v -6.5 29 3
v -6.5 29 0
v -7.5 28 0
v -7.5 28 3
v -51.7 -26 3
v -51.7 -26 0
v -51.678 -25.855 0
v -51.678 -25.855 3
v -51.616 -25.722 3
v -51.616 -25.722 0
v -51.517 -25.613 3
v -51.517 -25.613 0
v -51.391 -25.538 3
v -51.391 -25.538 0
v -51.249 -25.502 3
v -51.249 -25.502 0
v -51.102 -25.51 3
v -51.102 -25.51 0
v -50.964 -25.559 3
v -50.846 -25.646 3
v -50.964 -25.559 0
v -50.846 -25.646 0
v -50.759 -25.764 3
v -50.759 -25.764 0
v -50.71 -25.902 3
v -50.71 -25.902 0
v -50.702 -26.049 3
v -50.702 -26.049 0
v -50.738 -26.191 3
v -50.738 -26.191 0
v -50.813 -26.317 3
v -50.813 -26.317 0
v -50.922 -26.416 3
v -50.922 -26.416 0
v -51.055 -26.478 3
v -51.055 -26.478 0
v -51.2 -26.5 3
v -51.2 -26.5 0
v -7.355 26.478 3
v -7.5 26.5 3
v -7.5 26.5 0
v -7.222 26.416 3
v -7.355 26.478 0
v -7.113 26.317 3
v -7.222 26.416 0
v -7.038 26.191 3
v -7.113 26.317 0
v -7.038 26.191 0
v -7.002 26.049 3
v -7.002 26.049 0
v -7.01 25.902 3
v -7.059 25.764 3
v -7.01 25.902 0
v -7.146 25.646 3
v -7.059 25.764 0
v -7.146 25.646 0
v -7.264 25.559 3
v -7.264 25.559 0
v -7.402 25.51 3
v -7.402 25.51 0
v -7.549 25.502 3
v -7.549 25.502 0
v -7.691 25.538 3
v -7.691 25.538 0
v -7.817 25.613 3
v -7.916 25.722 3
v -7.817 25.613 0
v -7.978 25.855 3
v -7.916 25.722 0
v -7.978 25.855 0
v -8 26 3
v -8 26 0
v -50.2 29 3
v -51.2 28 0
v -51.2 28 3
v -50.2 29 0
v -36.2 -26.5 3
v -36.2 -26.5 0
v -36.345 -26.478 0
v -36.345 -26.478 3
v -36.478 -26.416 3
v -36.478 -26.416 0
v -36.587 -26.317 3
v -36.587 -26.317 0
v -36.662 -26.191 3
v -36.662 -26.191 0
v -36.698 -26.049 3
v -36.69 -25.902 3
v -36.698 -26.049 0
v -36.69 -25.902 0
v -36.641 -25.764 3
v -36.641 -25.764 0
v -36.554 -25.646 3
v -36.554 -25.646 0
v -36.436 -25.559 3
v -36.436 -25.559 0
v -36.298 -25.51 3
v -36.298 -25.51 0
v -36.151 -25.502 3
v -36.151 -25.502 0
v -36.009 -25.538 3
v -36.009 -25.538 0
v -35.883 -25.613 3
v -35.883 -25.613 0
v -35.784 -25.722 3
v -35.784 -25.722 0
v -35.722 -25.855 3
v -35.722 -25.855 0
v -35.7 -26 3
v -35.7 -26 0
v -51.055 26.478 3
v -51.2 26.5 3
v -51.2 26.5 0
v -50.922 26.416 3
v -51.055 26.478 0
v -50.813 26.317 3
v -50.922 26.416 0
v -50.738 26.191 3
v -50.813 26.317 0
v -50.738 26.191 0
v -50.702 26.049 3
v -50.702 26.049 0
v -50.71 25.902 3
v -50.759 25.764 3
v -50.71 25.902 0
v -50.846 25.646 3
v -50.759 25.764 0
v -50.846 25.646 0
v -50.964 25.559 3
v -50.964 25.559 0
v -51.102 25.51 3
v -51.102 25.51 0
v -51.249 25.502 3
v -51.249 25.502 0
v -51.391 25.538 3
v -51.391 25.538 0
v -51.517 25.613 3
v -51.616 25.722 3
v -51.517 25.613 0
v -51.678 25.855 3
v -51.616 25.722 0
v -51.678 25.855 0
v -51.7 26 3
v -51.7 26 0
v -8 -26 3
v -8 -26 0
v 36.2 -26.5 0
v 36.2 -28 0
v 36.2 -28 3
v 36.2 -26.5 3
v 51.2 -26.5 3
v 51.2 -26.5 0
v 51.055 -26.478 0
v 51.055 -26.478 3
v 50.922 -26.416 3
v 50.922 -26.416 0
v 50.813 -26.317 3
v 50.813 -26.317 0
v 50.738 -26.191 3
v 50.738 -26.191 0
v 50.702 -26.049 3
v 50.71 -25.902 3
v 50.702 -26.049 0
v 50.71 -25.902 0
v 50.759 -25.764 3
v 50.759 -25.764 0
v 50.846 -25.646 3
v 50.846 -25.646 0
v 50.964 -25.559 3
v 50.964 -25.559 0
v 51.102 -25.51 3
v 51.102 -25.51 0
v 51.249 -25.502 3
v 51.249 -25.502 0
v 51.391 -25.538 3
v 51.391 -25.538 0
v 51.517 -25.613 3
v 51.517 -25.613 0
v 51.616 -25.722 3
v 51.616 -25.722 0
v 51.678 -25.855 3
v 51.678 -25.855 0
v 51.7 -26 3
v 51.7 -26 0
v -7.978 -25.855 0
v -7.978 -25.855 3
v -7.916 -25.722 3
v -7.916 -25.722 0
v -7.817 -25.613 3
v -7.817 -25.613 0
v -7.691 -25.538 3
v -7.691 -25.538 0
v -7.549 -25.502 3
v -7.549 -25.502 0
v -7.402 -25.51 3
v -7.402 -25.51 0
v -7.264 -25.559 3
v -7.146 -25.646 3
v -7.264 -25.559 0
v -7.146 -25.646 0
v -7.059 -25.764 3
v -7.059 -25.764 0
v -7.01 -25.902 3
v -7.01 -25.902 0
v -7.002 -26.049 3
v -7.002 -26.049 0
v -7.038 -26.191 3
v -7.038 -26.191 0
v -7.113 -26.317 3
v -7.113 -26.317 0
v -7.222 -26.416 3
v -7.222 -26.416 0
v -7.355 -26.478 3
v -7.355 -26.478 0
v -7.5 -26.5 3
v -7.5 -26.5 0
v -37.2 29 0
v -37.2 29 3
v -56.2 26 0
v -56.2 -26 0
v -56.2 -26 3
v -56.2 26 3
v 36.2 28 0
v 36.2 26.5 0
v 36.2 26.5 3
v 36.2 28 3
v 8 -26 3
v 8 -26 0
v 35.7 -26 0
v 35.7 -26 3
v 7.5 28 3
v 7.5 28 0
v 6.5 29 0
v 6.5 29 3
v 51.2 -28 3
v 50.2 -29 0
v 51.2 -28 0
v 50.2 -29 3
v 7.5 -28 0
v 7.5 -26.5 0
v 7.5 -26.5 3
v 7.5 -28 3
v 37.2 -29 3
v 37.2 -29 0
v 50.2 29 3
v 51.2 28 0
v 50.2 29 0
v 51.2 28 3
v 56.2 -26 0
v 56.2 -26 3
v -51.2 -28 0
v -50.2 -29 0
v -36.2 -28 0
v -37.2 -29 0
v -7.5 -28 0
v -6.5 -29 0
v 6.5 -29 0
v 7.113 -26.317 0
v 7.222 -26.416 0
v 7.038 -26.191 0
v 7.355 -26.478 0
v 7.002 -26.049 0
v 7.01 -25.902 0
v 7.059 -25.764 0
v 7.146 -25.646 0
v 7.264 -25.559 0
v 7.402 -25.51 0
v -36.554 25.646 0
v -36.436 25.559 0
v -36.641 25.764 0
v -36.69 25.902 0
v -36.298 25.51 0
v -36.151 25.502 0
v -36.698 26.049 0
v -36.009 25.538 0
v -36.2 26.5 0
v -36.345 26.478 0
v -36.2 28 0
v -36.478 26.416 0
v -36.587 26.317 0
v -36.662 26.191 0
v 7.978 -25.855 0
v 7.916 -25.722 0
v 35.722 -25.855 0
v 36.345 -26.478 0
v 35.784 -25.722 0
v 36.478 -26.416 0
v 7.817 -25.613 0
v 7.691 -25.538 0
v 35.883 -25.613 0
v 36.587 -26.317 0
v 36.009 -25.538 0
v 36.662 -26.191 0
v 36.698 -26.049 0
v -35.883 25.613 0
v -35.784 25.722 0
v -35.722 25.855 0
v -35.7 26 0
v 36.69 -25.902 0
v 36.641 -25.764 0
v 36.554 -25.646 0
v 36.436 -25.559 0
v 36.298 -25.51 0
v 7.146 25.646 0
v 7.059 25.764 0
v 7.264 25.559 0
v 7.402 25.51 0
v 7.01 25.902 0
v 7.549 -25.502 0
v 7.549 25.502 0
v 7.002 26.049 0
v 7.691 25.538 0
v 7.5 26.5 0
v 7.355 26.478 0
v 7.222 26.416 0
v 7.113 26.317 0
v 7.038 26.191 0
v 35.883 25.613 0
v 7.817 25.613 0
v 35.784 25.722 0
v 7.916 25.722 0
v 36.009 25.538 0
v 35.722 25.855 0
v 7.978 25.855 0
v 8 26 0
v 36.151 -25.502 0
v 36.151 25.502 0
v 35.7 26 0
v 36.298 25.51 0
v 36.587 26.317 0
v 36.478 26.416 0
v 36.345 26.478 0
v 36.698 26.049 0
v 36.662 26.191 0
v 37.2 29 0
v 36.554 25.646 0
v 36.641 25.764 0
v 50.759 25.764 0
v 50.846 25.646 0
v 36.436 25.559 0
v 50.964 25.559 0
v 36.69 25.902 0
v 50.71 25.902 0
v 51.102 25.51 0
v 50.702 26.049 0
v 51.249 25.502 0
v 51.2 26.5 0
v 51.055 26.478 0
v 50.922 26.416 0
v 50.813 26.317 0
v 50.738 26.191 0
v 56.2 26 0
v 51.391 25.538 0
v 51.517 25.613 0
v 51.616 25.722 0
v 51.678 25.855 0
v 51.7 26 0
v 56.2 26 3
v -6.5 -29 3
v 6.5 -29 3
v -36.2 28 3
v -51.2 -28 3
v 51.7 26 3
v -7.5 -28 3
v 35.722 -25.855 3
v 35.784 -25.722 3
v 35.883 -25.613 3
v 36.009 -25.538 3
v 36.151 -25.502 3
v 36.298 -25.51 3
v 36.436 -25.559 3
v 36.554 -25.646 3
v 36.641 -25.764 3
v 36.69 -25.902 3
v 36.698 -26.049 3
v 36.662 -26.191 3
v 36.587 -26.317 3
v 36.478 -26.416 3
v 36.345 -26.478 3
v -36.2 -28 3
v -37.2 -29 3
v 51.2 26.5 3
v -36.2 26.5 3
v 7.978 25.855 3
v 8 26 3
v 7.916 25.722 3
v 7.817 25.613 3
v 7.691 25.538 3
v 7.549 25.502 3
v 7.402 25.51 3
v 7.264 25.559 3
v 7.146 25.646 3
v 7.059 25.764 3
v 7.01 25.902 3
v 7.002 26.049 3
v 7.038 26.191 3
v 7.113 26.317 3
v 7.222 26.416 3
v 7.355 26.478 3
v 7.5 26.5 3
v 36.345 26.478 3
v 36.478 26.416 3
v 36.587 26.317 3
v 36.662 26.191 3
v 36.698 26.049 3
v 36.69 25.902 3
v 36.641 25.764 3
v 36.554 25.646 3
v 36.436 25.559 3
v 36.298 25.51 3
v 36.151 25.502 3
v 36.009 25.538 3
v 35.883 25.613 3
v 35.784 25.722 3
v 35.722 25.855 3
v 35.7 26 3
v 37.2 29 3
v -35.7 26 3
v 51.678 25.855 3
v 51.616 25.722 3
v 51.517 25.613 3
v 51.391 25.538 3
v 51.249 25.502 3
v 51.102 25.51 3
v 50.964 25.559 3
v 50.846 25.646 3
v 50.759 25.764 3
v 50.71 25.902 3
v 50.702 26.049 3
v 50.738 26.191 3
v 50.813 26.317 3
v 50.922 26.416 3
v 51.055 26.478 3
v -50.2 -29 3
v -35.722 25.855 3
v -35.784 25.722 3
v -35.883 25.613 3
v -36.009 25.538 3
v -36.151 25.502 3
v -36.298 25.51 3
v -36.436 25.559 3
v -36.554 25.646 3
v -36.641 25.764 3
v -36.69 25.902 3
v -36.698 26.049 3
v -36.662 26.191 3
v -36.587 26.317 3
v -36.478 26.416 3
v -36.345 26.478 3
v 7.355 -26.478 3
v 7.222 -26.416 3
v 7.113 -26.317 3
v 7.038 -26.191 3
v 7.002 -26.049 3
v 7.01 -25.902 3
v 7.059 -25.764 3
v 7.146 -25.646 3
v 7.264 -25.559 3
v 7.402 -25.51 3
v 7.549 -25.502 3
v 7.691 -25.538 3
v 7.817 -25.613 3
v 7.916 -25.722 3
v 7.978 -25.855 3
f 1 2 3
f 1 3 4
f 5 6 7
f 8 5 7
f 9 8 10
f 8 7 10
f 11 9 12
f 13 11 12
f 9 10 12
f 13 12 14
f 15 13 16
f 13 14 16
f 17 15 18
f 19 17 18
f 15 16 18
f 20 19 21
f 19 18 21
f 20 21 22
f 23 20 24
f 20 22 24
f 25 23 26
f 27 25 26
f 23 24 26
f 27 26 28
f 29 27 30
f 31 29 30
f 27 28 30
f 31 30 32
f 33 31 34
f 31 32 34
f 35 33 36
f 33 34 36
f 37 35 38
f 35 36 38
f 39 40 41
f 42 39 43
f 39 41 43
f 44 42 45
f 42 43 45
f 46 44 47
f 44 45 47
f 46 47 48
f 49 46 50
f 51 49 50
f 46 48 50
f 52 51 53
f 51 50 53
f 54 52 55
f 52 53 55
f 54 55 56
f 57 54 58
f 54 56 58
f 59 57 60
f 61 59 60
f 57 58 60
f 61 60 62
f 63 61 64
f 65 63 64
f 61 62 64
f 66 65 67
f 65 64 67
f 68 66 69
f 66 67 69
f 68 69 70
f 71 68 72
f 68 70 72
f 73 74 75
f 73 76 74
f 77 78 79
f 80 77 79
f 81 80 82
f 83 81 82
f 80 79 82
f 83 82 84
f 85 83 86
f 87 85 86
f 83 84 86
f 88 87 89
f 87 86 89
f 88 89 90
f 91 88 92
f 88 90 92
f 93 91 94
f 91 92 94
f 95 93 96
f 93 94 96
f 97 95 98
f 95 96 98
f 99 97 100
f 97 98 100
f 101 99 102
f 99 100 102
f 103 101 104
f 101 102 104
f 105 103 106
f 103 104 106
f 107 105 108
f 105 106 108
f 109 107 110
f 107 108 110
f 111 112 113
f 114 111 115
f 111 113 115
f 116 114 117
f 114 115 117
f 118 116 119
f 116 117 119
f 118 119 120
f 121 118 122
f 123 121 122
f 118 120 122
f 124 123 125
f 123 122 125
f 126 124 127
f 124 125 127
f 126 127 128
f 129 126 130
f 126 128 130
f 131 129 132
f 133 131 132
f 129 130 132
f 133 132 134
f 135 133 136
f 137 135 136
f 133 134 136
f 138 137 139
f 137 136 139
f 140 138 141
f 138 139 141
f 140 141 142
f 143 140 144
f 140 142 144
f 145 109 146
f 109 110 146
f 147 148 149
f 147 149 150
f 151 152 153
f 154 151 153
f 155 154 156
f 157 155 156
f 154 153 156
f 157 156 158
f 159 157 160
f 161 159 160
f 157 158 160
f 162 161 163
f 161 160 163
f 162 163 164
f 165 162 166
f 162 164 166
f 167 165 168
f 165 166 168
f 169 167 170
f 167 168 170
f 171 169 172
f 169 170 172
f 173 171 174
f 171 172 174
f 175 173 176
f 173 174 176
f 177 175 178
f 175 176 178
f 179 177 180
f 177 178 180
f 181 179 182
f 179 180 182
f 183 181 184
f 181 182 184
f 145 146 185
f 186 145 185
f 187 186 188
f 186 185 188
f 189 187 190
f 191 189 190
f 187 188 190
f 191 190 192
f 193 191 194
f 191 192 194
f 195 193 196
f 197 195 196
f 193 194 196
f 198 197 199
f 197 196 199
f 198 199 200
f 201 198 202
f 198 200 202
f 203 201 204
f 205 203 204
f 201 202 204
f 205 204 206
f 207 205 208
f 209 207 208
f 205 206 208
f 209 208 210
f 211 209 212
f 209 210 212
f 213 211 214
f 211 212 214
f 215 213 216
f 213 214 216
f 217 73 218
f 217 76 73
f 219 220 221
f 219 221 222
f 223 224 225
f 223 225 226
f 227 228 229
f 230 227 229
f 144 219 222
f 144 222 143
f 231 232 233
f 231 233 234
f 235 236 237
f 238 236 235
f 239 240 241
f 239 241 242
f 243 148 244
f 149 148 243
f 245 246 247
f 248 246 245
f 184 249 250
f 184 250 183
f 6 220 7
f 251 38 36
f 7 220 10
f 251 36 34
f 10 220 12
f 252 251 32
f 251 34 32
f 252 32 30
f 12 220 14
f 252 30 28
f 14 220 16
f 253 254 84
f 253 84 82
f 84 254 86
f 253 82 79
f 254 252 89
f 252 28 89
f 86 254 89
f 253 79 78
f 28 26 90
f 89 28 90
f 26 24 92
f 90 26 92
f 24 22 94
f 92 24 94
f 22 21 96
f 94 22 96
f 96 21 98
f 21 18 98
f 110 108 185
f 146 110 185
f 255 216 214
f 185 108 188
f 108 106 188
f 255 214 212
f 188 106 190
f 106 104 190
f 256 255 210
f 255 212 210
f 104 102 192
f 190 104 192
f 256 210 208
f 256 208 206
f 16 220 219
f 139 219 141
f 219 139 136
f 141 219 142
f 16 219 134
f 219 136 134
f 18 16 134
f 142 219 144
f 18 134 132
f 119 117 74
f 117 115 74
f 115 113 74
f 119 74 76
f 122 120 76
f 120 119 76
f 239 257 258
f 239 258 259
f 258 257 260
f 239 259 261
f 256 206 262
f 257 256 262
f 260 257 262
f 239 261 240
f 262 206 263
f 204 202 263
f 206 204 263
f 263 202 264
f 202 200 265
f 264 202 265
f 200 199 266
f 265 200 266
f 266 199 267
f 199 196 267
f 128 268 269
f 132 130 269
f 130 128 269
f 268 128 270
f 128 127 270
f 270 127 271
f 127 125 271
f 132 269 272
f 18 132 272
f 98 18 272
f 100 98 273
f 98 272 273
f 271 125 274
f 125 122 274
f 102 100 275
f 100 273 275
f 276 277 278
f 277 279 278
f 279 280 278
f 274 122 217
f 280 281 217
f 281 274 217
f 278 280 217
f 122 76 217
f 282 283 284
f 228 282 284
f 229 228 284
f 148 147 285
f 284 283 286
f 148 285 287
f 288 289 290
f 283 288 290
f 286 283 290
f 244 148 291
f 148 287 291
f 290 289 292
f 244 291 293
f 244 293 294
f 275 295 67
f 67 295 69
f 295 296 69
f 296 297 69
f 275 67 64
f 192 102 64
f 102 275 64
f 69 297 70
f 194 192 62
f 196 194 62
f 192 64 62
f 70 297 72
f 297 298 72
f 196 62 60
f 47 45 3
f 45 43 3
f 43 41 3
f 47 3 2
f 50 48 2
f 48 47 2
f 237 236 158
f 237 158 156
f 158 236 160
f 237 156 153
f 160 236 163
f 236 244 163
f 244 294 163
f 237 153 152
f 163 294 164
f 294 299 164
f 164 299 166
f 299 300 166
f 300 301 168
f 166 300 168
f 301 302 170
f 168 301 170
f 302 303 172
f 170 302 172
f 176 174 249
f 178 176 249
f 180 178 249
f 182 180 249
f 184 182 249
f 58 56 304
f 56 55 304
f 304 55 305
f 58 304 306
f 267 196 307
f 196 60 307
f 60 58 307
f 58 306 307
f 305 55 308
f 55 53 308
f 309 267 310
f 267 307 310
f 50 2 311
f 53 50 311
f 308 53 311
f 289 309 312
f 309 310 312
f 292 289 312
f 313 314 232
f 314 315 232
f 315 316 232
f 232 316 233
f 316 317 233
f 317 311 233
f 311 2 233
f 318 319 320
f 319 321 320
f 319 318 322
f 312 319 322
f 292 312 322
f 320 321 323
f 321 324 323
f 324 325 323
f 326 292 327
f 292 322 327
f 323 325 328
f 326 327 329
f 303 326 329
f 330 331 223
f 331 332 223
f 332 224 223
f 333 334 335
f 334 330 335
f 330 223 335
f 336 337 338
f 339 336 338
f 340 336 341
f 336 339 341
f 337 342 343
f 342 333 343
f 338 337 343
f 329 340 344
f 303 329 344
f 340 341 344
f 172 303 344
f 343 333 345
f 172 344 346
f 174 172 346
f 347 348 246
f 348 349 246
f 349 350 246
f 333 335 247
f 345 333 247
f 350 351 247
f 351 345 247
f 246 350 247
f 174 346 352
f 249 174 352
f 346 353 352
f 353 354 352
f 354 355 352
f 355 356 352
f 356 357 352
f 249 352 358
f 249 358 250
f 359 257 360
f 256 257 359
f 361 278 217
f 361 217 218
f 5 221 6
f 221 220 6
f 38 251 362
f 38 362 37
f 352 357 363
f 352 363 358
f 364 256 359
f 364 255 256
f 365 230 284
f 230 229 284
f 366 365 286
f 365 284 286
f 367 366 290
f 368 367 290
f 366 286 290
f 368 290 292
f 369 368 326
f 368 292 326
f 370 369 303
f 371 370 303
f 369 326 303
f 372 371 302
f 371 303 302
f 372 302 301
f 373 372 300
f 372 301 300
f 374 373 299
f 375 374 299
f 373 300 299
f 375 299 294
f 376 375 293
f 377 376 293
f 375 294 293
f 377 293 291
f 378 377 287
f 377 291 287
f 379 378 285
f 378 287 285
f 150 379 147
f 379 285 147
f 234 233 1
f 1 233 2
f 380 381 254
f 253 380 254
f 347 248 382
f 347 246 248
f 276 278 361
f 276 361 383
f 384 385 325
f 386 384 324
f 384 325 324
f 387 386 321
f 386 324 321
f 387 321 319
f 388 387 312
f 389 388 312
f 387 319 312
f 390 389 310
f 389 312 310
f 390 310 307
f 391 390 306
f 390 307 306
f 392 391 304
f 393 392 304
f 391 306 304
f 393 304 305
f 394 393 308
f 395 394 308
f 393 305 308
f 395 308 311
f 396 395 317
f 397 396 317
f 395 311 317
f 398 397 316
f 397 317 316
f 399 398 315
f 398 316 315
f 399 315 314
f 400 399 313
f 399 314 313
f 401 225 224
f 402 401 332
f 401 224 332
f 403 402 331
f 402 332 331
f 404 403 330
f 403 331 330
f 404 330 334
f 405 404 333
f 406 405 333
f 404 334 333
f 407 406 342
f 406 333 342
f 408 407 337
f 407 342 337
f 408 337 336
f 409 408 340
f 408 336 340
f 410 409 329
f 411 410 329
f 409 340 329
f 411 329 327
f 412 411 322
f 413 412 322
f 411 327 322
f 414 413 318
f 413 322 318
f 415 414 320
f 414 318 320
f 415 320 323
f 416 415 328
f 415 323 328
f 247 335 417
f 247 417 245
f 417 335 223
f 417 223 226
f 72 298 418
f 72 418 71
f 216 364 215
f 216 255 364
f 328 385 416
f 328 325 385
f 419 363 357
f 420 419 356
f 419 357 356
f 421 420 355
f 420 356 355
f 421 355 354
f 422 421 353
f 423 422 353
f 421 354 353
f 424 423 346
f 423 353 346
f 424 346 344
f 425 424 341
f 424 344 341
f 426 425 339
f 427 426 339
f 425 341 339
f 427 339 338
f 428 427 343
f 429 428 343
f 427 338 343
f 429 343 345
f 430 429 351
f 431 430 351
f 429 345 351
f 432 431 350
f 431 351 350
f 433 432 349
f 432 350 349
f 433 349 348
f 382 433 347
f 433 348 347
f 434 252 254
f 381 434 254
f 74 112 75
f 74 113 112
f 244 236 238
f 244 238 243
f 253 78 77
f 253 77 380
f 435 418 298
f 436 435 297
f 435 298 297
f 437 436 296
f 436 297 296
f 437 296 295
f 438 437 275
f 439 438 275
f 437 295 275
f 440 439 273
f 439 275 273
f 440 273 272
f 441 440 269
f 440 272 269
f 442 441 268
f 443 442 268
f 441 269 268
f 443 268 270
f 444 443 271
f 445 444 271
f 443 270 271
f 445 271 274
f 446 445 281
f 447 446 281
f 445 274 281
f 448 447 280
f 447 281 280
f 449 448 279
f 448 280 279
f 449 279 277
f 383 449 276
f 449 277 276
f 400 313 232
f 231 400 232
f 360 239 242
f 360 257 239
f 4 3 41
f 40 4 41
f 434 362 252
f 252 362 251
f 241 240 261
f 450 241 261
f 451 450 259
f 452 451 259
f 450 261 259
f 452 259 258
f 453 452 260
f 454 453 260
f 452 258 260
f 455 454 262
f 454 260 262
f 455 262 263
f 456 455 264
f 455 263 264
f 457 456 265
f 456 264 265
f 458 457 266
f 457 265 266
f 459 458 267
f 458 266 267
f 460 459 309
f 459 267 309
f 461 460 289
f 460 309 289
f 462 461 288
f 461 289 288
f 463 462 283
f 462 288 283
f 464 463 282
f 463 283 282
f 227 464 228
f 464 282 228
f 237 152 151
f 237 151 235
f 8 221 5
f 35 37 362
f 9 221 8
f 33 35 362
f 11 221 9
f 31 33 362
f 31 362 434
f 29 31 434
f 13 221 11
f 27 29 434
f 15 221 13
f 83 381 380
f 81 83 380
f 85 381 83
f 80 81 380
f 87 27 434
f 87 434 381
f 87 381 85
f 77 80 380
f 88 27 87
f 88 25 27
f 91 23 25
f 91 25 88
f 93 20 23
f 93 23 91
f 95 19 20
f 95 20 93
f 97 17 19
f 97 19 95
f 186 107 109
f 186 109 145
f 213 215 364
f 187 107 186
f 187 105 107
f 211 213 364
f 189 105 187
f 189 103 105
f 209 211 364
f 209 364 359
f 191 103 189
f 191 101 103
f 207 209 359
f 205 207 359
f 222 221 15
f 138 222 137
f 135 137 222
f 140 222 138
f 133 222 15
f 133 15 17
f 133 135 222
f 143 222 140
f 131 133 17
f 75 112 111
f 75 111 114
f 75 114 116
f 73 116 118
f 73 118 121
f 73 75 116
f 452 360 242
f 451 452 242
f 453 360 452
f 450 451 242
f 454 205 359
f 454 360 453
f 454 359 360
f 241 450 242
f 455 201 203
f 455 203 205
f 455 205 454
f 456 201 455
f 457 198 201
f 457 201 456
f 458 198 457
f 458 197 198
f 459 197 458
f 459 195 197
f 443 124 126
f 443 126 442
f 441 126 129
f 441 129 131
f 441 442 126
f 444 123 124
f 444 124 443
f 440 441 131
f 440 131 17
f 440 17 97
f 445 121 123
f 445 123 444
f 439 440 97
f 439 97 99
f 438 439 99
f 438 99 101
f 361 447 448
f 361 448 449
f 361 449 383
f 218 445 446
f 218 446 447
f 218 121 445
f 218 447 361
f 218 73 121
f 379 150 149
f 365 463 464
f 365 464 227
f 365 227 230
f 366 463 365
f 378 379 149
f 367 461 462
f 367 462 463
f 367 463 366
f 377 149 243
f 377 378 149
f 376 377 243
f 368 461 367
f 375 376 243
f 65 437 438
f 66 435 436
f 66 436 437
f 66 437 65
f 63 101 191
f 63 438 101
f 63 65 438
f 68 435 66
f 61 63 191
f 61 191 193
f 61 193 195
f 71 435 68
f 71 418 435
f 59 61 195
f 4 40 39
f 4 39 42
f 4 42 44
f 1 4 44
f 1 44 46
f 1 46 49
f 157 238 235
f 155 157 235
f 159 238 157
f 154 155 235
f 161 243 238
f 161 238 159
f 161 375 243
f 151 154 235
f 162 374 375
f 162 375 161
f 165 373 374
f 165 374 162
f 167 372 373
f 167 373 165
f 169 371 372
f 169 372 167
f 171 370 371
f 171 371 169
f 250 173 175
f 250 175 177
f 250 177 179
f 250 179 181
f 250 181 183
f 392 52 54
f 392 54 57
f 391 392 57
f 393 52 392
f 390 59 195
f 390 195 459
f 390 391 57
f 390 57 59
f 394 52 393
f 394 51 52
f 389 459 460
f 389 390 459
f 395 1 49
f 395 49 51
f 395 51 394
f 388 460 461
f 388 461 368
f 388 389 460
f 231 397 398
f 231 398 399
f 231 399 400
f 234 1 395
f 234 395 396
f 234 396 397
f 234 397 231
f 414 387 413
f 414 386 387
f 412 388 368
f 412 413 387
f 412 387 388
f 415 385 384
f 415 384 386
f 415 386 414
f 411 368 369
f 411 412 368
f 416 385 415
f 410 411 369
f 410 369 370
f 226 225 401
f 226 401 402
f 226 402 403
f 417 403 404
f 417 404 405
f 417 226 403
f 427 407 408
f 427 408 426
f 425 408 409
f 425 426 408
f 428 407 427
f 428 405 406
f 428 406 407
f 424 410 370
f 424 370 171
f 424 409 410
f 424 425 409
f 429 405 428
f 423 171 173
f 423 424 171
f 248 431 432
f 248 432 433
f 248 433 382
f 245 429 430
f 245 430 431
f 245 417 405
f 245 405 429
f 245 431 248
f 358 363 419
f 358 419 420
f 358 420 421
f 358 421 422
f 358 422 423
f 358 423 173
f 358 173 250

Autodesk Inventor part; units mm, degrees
ref_plane "Plan YZ" through (0, 0, 0) normal (1, 0, 0) x (0, 1, 0)
ref_plane "Plan XZ" through (0, 0, 0) normal (0, 1, 0) x (-1, 0, 0)
ref_plane "Plan XY" through (0, 0, 0) normal (0, 0, 1) x (1, 0, 0)
sketch "Esquisse7" plane through (0, 0, 0) normal (0, 0, 1) x (1, 0, 0)
  line L0 (-56.2, -26) -> (-56.2, 26)
  line L1 (-56.2, 26) -> (-51.2, 26)
  line L2 (-51.2, 26) -> (-51.2, 29)
  line L3 (-51.2, 29) -> (-36.2, 29)
  line L4 (-36.2, 29) -> (-36.2, 26)
  line L5 (36.2, 26) -> (36.2, 29)
  line L6 (36.2, 29) -> (51.2, 29)
  line L7 (51.2, 29) -> (51.2, 26)
  line L8 (51.2, 26) -> (56.2, 26)
  line L9 (56.2, 26) -> (56.2, -26)
  line L10 (56.2, -26) -> (51.2, -26)
  line L11 (51.2, -26) -> (51.2, -29)
  line L12 (51.2, -29) -> (36.2, -29)
  line L13 (36.2, -29) -> (36.2, -26)
  line L14 (-36.2, -26) -> (-36.2, -29)
  line L15 (-51.2, -29) -> (-51.2, -26)
  line L16 (-56.2, -26) -> (-51.2, -26)
  line L17 (-51.2, -29) -> (-36.2, -29)
  line L18 (0, -40.6) -> (0, 40.6) construction
  line L19 (-78.68, 0) -> (78.68, 0) construction
  line L20 (7.5, 26) -> (7.5, 29)
  line L21 (7.5, 29) -> (-7.5, 29)
  line L22 (-7.5, 29) -> (-7.5, 26)
  line L23 (7.5, -26) -> (7.5, -29)
  line L24 (7.5, -29) -> (-7.5, -29)
  line L25 (-7.5, -29) -> (-7.5, -26)
  line L26 (-36.2, -26) -> (-7.5, -26)
  line L27 (7.5, -26) -> (36.2, -26)
  line L28 (-36.2, 26) -> (-7.5, 26)
  line L29 (7.5, 26) -> (36.2, 26)
  point P0 (0, 0)
  dimension "d33" = 52
  dimension "d34" = 5
  dimension "d35" = 3
  dimension "d36" = 15
  dimension "d51" = 112.4
extrude "Extrusion2" add sketch "Esquisse7" along normal blind 3
chamfer "Chanfrein4" distance 1 angle 45 12 edges at (-51.2, 29, 1.5) (-7.5, 29, 1.5) (36.2, 29, 1.5) (-36.2, 29, 1.5) (7.5, 29, 1.5) (51.2, 29, 1.5) (-36.2, -29, 1.5) (-51.2, -29, 1.5) (-7.5, -29, 1.5) (7.5, -29, 1.5) (36.2, -29, 1.5) (51.2, -29, 1.5)
sketch "Esquisse9" plane through (0, 0, 3) normal (0, 0, 1) x (1, 0, 0)
  line L0 (-56.2, 26) -> (-51.2, 26) construction
  line L1 (-51.2, 26) -> (-51.2, 28) construction
  line L2 (-36.2, 28) -> (-36.2, 26) construction
  line L3 (-36.2, 26) -> (-7.5, 26) construction
  line L4 (-7.5, 26) -> (-7.5, 28) construction
  line L5 (7.5, 28) -> (7.5, 26) construction
  line L6 (7.5, 26) -> (36.2, 26) construction
  line L7 (36.2, 26) -> (36.2, 28) construction
  line L8 (51.2, 28) -> (51.2, 26) construction
  line L9 (51.2, 26) -> (56.2, 26) construction
  line L10 (7.5, -26) -> (7.5, -28) construction
  line L11 (36.2, -26) -> (7.5, -26) construction
  line L12 (36.2, -28) -> (36.2, -26) construction
  line L13 (51.2, -26) -> (51.2, -28) construction
  line L14 (56.2, -26) -> (51.2, -26) construction
  line L15 (-7.5, -26) -> (-36.2, -26) construction
  line L16 (-7.5, -28) -> (-7.5, -26) construction
  line L17 (-36.2, -26) -> (-36.2, -28) construction
  line L18 (-51.2, -28) -> (-51.2, -26) construction
  line L19 (-51.2, -26) -> (-56.2, -26) construction
  point P0 (0, 0)
hole "Perçage3" at (-51.2, 26, 3) at (-36.2, 26, 3) at (-7.5, 26, 3) at (36.2, 26, 3) at (51.2, 26, 3) at (7.5, 26, 3) at (36.2, -26, 3) at (51.2, -26, 3) at (7.5, -26, 3) at (-7.5, -26, 3) at (-36.2, -26, 3) at (-51.2, -26, 3) direction (0, 0, -1) diameter 1 end through all
properties part number "P1704_104" material "Plastique PMMA"
